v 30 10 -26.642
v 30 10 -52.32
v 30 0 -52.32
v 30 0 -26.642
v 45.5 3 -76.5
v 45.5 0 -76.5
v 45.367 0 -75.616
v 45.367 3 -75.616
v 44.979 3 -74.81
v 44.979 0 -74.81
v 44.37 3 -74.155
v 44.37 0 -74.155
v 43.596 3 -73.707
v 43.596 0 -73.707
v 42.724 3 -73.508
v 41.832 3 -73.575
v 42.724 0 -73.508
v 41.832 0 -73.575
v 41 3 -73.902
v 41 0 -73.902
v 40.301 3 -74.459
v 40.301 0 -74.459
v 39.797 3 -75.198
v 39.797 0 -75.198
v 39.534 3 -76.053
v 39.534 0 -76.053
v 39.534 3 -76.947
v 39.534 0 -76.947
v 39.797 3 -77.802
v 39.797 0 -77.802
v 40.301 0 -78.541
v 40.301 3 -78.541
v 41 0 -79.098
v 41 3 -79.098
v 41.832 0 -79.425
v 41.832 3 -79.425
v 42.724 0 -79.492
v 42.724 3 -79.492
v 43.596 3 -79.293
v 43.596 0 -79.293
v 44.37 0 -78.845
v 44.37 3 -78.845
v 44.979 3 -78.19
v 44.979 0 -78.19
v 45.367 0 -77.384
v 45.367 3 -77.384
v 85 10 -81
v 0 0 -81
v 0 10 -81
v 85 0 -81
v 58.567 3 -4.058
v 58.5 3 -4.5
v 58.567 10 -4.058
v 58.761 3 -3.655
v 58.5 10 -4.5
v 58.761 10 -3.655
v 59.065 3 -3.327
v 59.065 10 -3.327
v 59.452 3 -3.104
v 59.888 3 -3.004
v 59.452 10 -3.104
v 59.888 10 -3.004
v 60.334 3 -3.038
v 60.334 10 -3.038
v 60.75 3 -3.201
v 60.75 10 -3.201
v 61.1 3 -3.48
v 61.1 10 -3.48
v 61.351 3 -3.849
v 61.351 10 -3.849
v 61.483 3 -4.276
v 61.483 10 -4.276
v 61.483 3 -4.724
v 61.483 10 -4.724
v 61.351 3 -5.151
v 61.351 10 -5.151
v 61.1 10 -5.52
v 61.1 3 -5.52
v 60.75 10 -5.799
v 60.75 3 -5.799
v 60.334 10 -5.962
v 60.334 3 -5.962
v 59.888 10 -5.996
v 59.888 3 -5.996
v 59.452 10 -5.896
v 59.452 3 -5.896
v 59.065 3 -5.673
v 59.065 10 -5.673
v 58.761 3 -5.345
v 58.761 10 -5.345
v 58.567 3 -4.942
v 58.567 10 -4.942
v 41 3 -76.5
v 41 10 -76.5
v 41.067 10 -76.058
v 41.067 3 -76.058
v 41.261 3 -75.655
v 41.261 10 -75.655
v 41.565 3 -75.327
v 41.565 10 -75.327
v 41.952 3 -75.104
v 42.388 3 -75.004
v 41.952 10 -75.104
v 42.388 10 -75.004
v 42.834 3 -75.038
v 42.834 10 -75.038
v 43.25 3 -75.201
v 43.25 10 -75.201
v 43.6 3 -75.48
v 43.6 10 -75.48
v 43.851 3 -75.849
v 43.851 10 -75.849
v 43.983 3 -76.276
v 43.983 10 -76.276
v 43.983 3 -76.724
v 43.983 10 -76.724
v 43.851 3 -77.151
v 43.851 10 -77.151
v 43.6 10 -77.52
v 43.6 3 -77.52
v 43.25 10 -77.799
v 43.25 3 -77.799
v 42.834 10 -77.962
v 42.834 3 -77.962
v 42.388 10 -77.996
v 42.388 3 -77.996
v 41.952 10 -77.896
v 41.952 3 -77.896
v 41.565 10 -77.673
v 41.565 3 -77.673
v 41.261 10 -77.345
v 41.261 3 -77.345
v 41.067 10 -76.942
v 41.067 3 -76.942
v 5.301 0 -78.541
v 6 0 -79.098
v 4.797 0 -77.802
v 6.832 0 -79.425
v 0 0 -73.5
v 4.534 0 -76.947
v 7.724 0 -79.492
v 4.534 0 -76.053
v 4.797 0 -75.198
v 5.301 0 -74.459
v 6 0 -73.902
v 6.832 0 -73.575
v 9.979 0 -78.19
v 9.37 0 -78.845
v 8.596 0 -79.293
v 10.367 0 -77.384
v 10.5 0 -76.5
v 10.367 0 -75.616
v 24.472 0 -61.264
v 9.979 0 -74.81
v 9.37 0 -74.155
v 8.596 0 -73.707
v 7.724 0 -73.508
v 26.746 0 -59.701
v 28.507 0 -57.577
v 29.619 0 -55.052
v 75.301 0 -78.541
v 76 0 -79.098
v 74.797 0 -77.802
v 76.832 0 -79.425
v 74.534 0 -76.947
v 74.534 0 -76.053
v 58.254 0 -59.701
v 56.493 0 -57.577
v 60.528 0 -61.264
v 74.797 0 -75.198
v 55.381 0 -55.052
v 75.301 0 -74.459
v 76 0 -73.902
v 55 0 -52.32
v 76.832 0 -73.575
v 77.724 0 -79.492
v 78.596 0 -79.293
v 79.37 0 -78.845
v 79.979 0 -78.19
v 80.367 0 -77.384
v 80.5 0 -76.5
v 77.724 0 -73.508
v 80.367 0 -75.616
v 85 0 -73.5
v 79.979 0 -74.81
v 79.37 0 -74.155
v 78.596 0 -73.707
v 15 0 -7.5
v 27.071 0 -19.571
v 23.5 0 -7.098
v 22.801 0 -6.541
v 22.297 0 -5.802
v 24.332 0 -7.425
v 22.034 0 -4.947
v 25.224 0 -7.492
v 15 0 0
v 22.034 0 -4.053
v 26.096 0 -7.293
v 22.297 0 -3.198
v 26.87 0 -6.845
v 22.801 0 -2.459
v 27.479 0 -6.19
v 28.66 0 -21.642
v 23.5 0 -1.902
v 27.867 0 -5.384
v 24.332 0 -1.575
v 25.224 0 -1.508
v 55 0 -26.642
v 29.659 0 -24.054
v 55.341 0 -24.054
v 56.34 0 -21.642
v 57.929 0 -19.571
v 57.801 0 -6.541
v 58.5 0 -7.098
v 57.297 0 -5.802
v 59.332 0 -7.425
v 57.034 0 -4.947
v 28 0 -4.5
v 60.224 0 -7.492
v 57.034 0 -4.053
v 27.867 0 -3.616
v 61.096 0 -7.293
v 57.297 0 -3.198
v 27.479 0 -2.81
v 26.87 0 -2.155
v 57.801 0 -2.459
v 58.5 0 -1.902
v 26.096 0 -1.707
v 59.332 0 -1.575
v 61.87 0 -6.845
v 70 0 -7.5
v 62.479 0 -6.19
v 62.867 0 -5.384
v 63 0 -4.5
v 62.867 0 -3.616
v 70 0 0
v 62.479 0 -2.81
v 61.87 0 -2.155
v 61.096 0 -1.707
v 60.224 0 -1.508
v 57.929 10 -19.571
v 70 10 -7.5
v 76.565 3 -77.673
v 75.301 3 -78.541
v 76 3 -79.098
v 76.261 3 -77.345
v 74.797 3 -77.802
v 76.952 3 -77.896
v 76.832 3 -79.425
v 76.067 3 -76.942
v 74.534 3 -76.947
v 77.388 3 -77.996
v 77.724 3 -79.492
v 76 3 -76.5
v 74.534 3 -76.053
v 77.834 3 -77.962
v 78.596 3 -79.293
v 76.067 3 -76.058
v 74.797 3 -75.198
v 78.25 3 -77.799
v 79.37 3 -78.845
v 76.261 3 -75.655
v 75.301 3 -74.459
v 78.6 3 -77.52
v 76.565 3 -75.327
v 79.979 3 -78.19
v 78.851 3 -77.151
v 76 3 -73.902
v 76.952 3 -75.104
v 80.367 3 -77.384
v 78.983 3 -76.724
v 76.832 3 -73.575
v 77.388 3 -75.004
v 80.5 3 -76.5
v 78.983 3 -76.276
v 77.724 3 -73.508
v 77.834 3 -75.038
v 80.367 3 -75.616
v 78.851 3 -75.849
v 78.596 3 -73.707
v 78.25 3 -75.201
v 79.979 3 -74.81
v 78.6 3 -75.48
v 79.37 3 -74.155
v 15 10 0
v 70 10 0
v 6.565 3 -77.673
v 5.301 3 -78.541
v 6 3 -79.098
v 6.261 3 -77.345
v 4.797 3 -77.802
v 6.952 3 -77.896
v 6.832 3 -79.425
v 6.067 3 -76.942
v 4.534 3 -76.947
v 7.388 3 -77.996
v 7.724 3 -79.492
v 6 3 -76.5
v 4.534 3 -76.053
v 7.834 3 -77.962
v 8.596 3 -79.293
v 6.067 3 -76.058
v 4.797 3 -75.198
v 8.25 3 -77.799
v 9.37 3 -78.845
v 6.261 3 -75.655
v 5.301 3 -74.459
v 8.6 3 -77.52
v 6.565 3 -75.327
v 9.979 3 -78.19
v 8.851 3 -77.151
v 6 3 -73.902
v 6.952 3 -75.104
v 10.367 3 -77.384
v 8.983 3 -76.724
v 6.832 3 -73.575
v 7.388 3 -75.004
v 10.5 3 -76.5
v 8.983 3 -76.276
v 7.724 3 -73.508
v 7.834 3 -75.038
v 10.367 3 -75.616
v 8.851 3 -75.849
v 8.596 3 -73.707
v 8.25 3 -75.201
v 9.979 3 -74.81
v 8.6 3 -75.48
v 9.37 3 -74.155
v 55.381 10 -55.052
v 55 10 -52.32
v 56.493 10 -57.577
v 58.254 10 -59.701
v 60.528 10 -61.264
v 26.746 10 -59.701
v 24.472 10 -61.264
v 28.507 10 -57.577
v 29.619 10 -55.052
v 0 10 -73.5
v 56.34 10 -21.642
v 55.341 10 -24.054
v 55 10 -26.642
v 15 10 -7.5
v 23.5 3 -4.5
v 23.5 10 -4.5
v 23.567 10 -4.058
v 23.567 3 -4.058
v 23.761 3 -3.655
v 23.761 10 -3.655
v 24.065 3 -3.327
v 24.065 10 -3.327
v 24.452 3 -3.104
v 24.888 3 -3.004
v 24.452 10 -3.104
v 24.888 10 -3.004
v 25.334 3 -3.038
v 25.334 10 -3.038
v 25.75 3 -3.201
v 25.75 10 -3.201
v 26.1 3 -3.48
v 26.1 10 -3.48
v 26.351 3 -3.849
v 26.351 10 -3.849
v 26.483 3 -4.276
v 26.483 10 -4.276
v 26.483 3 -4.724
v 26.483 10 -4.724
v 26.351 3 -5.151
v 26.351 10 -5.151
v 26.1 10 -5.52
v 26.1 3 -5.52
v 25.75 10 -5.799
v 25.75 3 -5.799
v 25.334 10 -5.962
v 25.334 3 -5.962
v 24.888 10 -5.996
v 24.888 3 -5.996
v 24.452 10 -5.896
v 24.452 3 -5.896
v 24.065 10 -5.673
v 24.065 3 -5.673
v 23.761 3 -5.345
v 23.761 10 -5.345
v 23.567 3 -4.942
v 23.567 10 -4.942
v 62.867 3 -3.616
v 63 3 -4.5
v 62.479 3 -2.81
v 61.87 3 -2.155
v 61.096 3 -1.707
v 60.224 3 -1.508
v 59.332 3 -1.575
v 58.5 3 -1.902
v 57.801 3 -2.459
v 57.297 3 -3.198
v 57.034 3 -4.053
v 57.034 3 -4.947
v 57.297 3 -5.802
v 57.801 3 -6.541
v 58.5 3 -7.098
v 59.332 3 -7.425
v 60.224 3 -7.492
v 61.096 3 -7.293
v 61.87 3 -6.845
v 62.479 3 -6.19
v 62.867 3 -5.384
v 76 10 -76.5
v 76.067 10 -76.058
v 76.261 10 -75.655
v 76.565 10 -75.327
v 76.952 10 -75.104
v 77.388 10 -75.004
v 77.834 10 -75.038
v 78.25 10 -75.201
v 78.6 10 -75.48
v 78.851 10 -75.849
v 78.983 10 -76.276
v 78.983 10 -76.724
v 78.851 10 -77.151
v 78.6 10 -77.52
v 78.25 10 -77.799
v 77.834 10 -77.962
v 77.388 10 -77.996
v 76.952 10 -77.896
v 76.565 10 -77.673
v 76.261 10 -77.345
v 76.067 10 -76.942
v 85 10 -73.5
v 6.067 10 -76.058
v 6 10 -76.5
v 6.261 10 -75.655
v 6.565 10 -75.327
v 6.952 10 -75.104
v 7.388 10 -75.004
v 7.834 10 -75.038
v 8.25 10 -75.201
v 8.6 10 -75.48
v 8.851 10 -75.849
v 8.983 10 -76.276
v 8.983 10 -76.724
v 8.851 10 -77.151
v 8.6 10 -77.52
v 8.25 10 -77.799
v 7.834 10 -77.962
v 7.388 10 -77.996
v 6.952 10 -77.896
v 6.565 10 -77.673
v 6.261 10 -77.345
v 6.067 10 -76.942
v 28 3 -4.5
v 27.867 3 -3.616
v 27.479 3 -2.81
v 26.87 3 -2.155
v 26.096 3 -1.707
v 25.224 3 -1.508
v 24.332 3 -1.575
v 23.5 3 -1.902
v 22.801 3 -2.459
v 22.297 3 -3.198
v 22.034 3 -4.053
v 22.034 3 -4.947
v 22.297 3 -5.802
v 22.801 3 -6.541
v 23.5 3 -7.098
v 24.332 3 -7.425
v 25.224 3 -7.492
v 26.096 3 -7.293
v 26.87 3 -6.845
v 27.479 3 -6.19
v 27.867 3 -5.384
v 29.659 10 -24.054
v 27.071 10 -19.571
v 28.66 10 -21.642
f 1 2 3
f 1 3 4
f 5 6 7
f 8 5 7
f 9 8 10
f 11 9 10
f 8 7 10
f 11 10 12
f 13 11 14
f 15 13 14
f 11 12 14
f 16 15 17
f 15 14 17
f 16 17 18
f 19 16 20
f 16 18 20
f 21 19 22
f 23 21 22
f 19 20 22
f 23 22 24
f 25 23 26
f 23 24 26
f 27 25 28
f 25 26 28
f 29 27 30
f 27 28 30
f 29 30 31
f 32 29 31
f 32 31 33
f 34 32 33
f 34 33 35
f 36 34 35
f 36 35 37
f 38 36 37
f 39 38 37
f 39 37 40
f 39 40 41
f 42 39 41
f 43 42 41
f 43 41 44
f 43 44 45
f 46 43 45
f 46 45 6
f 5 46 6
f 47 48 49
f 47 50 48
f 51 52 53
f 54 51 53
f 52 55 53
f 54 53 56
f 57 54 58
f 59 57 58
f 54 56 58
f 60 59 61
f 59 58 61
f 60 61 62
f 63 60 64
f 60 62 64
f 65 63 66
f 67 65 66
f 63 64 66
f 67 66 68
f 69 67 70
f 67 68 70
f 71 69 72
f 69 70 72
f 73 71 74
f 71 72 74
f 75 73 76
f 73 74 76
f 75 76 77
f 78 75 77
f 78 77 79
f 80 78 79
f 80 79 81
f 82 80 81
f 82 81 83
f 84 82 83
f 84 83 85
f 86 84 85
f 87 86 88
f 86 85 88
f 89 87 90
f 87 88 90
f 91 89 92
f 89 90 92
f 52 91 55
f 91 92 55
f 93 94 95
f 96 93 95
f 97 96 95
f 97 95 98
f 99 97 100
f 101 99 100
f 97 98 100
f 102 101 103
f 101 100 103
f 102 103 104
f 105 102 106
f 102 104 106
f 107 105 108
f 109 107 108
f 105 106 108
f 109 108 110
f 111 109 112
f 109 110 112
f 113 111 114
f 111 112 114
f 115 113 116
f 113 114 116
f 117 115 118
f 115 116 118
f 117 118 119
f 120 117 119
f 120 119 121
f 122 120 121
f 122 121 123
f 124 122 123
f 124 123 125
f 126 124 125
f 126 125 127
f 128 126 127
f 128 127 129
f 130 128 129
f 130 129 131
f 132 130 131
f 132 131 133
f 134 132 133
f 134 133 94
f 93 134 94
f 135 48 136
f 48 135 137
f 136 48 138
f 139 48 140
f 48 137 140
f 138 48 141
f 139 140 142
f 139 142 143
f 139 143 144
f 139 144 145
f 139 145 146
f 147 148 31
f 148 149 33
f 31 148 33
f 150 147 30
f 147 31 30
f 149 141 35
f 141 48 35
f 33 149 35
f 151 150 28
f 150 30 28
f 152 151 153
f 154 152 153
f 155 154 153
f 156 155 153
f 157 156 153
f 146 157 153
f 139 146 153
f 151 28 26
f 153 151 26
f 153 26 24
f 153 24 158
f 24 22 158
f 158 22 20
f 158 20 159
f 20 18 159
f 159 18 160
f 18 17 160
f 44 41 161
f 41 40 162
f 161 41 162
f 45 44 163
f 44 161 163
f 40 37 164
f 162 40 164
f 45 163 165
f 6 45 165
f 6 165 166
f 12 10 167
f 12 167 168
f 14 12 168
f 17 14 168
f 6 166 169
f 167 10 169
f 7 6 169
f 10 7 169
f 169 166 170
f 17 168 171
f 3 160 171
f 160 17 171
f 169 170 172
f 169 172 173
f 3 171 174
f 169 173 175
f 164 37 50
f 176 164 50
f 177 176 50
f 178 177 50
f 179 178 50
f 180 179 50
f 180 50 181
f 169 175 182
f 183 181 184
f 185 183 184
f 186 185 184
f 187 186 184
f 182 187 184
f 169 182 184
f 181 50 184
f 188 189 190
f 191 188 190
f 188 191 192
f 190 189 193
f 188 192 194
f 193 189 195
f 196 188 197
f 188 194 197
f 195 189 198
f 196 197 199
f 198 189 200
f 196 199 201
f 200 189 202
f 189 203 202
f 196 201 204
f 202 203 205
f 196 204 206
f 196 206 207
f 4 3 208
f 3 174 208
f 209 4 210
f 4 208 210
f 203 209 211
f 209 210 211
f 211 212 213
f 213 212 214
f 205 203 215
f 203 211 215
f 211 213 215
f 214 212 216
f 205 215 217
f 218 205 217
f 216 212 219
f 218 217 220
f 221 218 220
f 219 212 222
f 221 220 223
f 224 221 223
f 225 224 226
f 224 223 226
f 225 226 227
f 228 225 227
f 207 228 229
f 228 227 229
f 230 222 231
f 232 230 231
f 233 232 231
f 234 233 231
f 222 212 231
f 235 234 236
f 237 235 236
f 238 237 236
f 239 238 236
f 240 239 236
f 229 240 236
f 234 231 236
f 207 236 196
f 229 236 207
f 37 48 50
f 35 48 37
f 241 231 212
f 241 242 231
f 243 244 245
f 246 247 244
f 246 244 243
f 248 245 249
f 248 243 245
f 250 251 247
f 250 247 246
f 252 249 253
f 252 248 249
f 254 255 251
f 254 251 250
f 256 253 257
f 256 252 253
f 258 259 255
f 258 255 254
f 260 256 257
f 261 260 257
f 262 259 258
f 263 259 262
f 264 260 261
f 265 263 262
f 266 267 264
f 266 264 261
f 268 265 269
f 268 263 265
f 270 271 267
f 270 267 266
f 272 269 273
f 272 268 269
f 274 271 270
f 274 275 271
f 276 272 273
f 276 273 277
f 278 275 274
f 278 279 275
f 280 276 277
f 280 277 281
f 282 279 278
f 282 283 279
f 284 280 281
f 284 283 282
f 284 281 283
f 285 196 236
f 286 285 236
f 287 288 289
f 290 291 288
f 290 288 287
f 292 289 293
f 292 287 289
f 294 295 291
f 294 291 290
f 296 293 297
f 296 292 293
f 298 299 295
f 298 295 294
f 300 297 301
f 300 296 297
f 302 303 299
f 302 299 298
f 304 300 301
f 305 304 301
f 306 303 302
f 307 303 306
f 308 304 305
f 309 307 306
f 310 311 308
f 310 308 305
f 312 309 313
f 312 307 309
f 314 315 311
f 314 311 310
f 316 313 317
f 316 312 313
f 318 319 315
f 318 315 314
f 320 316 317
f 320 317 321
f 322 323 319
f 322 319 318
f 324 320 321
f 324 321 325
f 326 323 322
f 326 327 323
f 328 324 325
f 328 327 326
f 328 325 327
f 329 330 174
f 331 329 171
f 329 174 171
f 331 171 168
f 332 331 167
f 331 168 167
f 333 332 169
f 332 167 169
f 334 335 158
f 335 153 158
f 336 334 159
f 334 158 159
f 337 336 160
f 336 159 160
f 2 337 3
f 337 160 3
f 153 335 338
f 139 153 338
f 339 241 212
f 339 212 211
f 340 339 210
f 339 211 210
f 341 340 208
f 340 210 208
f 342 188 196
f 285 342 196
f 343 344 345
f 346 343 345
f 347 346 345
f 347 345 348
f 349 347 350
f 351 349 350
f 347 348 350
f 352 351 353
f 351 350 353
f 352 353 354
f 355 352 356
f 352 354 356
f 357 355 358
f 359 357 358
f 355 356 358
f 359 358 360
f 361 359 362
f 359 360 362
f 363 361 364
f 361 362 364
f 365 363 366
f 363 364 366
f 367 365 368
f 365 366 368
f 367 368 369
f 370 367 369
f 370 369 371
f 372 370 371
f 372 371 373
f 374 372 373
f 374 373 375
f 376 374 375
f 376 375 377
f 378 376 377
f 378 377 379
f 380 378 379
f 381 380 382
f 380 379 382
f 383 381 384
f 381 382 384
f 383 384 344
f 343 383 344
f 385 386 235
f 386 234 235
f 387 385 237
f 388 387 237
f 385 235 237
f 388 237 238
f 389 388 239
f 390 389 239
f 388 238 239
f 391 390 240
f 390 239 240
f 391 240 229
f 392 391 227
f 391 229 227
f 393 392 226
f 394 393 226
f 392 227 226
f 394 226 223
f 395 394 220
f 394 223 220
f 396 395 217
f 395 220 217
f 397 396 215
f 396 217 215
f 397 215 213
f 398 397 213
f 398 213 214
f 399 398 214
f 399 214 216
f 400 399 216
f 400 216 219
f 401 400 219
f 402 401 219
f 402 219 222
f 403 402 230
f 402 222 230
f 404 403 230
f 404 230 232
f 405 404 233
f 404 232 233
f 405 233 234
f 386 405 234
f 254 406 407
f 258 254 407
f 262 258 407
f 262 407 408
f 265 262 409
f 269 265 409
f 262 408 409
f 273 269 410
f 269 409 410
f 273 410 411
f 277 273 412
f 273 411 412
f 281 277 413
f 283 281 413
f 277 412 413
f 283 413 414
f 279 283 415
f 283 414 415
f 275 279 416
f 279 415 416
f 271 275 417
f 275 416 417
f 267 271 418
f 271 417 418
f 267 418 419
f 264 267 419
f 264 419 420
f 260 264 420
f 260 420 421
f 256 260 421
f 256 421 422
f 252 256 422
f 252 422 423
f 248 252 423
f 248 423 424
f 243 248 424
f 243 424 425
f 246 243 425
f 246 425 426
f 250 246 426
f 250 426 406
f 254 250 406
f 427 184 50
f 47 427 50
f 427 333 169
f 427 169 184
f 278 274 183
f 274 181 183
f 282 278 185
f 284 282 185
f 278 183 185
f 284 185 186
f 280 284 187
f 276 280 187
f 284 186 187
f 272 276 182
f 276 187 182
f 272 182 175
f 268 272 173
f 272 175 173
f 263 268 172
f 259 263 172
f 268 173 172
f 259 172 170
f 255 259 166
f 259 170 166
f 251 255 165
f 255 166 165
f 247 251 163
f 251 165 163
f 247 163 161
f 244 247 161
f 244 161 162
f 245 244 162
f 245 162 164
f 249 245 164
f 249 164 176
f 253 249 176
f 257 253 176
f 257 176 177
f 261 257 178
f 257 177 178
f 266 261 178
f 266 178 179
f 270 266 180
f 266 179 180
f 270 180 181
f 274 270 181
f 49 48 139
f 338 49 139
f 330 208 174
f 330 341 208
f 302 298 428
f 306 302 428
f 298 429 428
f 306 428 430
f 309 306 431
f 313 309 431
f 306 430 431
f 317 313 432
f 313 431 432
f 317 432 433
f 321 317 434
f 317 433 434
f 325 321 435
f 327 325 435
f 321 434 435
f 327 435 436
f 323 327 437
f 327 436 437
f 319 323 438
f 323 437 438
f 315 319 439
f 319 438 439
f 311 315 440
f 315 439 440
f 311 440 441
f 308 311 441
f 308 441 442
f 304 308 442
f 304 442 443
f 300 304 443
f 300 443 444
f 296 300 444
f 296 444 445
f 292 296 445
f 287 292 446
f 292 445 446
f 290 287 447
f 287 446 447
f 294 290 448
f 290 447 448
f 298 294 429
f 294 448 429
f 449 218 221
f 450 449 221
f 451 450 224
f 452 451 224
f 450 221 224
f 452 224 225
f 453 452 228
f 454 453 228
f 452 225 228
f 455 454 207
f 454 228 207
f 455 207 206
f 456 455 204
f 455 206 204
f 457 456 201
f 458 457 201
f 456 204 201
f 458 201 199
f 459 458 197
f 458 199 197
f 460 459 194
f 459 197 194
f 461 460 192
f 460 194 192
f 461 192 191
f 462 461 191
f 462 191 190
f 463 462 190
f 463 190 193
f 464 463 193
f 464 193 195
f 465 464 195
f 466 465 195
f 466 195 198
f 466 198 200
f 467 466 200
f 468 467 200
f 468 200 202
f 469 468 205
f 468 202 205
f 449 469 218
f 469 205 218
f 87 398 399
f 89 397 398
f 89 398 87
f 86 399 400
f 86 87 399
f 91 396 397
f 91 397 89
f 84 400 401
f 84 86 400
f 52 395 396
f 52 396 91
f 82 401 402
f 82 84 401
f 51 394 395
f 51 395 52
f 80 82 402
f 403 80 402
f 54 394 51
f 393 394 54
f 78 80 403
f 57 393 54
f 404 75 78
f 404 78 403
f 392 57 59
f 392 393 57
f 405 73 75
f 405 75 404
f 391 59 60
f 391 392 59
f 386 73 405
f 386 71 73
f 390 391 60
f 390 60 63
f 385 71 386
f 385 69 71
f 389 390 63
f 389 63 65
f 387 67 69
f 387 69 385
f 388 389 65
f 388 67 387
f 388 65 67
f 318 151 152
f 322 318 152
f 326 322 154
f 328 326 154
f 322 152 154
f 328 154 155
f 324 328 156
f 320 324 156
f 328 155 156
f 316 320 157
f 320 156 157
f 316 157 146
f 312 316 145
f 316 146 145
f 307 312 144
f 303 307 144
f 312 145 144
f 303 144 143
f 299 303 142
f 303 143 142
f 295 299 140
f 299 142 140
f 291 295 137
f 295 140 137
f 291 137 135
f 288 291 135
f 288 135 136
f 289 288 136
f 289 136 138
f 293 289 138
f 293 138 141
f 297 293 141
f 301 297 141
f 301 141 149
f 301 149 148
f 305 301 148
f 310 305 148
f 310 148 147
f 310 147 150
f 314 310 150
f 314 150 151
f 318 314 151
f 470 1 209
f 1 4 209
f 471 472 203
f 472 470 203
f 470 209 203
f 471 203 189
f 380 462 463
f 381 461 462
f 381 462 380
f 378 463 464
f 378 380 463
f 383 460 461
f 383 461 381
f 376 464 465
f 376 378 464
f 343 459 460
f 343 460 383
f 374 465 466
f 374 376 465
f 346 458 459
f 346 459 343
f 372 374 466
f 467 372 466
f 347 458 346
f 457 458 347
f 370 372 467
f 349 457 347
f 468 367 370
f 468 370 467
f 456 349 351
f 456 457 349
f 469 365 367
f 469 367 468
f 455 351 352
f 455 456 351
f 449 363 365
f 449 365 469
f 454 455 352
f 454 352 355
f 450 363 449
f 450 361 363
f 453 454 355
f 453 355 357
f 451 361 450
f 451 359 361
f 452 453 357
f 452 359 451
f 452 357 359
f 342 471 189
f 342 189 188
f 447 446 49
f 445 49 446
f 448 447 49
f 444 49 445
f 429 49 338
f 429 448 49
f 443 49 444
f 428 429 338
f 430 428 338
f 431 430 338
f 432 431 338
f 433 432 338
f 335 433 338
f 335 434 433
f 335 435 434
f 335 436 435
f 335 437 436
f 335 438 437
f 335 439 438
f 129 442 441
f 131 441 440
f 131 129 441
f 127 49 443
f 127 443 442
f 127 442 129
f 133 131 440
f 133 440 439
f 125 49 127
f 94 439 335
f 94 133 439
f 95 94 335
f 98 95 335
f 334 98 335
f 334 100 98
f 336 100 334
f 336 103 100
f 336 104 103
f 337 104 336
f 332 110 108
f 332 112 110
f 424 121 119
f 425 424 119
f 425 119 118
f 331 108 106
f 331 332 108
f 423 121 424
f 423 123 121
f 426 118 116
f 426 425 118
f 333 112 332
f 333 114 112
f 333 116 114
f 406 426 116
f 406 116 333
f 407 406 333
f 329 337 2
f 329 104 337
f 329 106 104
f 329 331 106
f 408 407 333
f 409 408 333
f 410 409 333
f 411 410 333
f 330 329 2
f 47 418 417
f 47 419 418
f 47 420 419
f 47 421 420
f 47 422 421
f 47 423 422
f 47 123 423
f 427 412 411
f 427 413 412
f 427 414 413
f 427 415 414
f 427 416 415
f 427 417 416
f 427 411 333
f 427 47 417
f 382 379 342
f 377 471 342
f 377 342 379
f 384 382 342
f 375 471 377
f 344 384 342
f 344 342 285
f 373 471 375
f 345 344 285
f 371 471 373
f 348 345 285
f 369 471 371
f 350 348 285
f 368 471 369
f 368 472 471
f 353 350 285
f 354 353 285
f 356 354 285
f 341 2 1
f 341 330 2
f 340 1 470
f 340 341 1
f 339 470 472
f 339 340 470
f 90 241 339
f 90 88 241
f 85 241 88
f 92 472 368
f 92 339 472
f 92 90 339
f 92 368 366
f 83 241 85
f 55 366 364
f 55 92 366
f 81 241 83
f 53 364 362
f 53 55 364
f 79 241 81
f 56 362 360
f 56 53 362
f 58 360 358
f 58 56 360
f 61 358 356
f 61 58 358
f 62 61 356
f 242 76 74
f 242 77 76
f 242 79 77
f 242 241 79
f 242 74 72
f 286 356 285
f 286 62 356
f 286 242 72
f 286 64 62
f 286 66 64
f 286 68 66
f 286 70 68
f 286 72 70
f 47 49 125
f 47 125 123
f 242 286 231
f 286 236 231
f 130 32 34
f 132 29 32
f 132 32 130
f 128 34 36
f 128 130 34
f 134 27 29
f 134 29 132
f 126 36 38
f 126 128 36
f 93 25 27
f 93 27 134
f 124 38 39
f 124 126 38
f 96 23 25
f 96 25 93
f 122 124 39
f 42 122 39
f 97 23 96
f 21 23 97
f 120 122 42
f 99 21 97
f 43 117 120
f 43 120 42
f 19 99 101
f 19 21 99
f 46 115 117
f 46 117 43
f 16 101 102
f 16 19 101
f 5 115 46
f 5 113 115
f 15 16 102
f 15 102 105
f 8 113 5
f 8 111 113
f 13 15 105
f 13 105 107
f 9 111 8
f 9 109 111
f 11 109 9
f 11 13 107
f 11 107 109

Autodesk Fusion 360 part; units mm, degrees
sketch "Sketch13" plane through (0, 0, 0) normal (0, 1, 0) x (1, 0, 0)
  line L0 (70, 0) -> (70, 81)
  line L1 (70, 81) -> (15, 81)
  line L2 (15, 81) -> (15, 0)
  line L3 (15, 0) -> (70, 0)
  line L4 (0, 0) -> (121.9113, 0) construction
  dimension "d66" = 55
  dimension "d130" = 81
  dimension "d131" = 15
extrude "Extrude10" add sketch "Sketch13" along normal blind 10
sketch "Sketch14" plane through (0, 10, 0) normal (0, 1, 0) x (-1, 0, 0)
  line L0 (-15, -81) -> (-15, 0)
  line L1 (-70, 0) -> (-70, -81)
  line L2 (-70, -81) -> (-15, -81)
  line L3 (-15, -73.5) -> (-30, -58.5)
  line L4 (-30, -58.5) -> (-30, -22.5)
  line L5 (-30, -22.5) -> (-15, -7.5)
  line L6 (-15, -40.5) -> (-70, -40.5) construction
  line L7 (-42.5, -81) -> (-42.5, 0) construction
  line L8 (-30, -40.5) -> (-87.9308, -40.5) construction
  line L9 (-70, -7.5) -> (-55, -22.5)
  line L10 (-55, -22.5) -> (-55, -58.5)
  line L11 (-55, -58.5) -> (-70, -73.5)
  circle A0 centre (-42.5, -76.5) radius 1.5
  circle A1 centre (-60, -76.5) radius 1.5
  circle A2 centre (-77.5, -76.5) radius 1.5
  circle A3 centre (-25, -76.5) radius 1.5
  circle A4 centre (-7.5, -76.5) radius 1.5
  line L12 (-7.5, -76.5) -> (-77.5, -76.5) construction
  circle A5 centre (-7.5, -4.5) radius 1.5
  circle A6 centre (-25, -4.5) radius 1.5
  circle A7 centre (-42.5, -4.5) radius 1.5
  circle A8 centre (-60, -4.5) radius 1.5
  circle A9 centre (-77.5, -4.5) radius 1.5
  line L13 (-7.5, -4.5) -> (-77.5, -4.5) construction
  line L14 (-15, 0) -> (-70, 0)
  line L15 (-30, -22.5) -> (-15, -22.5)
  line L16 (-55, -22.5) -> (-70, -22.5)
  line L17 (-30, -58.5) -> (-15, -58.5)
  line L18 (-55, -58.5) -> (-70, -58.5)
  line L19 (-70, -58.5) -> (-70, -73.5)
  line L20 (-15, -58.5) -> (-15, -73.5)
  line L21 (-15, -22.5) -> (-15, -7.5)
  line L22 (-70, -22.5) -> (-70, -7.5)
  line L23 (-70, -22.5) -> (-70, -58.5)
  line L24 (-15, -22.5) -> (-15, -58.5)
  dimension "d70" = 15
  dimension "d71" = 15
  dimension "d72" = 15
  dimension "d73" = 7.5
  dimension "d76" = 15
  dimension "d77" = 15
  dimension "d78" = 7.5
  dimension "d79" = 7.5
  dimension "d80" = 15
  dimension "d81" = 15
  dimension "d85" = 17.5
  dimension "d86" = 17.5
  dimension "d87" = 17.5
  dimension "d88" = 17.5
  dimension "d89" = 3
  dimension "d90" = 3
  dimension "d91" = 3
  dimension "d92" = 3
  dimension "d93" = 3
  dimension "d94" = 4.5
  dimension "d95" = 17.5
  dimension "d96" = 17.5
  dimension "d97" = 17.5
  dimension "d98" = 17.5
  dimension "d99" = 3
  dimension "d100" = 3
  dimension "d101" = 3
  dimension "d102" = 3
  dimension "d103" = 3
  dimension "d132" = 7.5
  dimension "d139" = 4.5
  dimension "d140" = 72
  dimension "d141" = 40.5
extrude "Extrude11" cut sketch "Sketch14" against normal blind 10 contours L0 L4 L15 L17 L24 | L0 L5 L15 L21 | L1 L10 L16 L18 L23 | L1 L9 L16 L22
sketch "Sketch16" plane through (0, 10, 0) normal (0, 1, 0) x (-1, 0, 0)
  line L0 (-70, -58.5) -> (-70, -81)
  line L1 (-70, -81) -> (-15, -81)
  line L2 (-15, -81) -> (-15, -58.5)
  line L3 (-30, -58.5) -> (-30, -22.5)
  circle A0 centre (-42.5, -40.5) radius 4
  line L4 (-15, 0) -> (-70, 0)
  line L5 (-70, 0) -> (-70, -7.5)
  line L6 (-55, -22.5) -> (-55, -58.5)
  line L7 (-15, -58.5) -> (-30, -58.5)
  line L8 (-30, -22.5) -> (-15, -7.5)
  line L9 (-15, -7.5) -> (-15, 0)
  line L10 (-70, -7.5) -> (-55, -22.5)
  line L11 (-55, -58.5) -> (-70, -58.5)
  dimension "d83" = 8
extrude "Extrude14" cut sketch "Sketch14" against normal blind 10 contours A6 | A8
sketch "Sketch17" plane through (30, 0, 0) normal (-1, 0, 0) x (0, 0, 1)
  line L0 (-58.5, 0) -> (-22.5, 0)
  line L1 (-22.5, 10) -> (-58.5, 10)
  circle A0 centre (-52.5, 6.35) radius 2
  circle A1 centre (-28.5, 6.35) radius 2
  line L2 (-52.5, 6.35) -> (-28.5, 6.35) construction
  line L3 (-58.5, 10) -> (-58.5, 0)
  line L4 (-22.5, 0) -> (-22.5, 10)
  dimension "d105" = 6.35
  dimension "d106" = 4
  dimension "d107" = 4
  dimension "d108" = 40.5
  dimension "d113" = 24
sketch "Sketch22" plane through (0, 10, 0) normal (0, 1, 0) x (-1, 0, 0)
  circle A0 centre (-60, -4.5) radius 1.5
  circle A1 centre (-25, -4.5) radius 1.5
  line L0 (-70, -58.5) -> (-70, -81)
  line L1 (-70, -81) -> (-15, -81)
  line L2 (-15, -81) -> (-15, -58.5)
  line L3 (-30, -58.5) -> (-30, -22.5)
  spline S0 degree 5 poles (-30, -22.5) (-30.6751, -22.9508) (-31.8982, -23.9212) (-33.3513, -25.5829) (-34.5873, -28.1895) (-35.2819, -31.9804) (-35.49, -36.1444) (-35.514, -40.4999) (-35.4911, -44.8557) (-35.2837, -49.0204) (-34.5894, -52.8118) (-33.353, -55.4184) (-31.8992, -57.0796) (-30.6755, -58.0495) (-30, -58.5) knots 0 0 0 0 0 0 0.1 0.2 0.3 0.4 0.5 0.6 0.7 0.8 0.9 1 1 1 1 1 1
  line L4 (-26.6736, -20.2785) -> (-33.3264, -24.7215)
  line L5 (-33.3277, -56.2805) -> (-26.6723, -60.7195)
  spline S1 degree 5 poles (-55, -22.5) (-54.3243, -22.9503) (-53.092, -23.9257) (-51.6007, -25.6127) (-50.2803, -28.2784) (-49.4997, -32.1312) (-49.3061, -36.2868) (-49.4506, -40.5251) (-49.7869, -44.6606) (-50.3396, -48.5814) (-51.2418, -52.2256) (-52.3883, -54.8952) (-53.5623, -56.7538) (-54.4956, -57.9286) (-55, -58.5) knots 0 0 0 0 0 0 0.1 0.2 0.3 0.4 0.5 0.6 0.7 0.8 0.9 1 1 1 1 1 1
  line L6 (-52.3529, -55.5012) -> (-57.6471, -61.4988)
  line L7 (-58.3285, -20.2817) -> (-51.6715, -24.7183)
  line L8 (-15, 0) -> (-70, 0)
  line L9 (-70, 0) -> (-70, -7.5)
  line L10 (-35.5, -40.5) -> (-49.5, -40.5) construction
  line L11 (-55, -22.5) -> (-55, -58.5)
  line L12 (-15, -58.5) -> (-30, -58.5)
  line L13 (-30, -22.5) -> (-15, -7.5)
  line L14 (-15, -7.5) -> (-15, 0)
  line L15 (-70, -7.5) -> (-55, -22.5)
  line L16 (-55, -58.5) -> (-70, -58.5)
  dimension "d135" = 4
  dimension "d136" = 4
  dimension "d137" = 4
  dimension "d138" = 4
  dimension "d161" = 40.5
  dimension "d162" = 14
  dimension "d163" = 35.5
extrude "Extrude22" add 1 faces at (70, 3.3333, -66) along direction (1, 0, 0) blind 15
extrude "Extrude23" add 1 faces at (15, 3.3333, -73.5) along direction (-1, 0, 0) blind 15
extrude "Extrude24" cut sketch "Sketch14" against normal through all contours A0 | A2 | A4
sketch "Sketch24" plane through (0, 0, 0) normal (0, -1, 0) x (1, 0, 0)
  circle A0 centre (7.5, -76.5) radius 1.5
  circle A1 centre (77.5, -76.5) radius 1.5
  circle A2 centre (42.5, -76.5) radius 1.5
  circle A3 centre (60, -4.5) radius 1.5
  circle A4 centre (25, -4.5) radius 1.5
  line L0 (0, -58.5) -> (0, -81)
  line L1 (0, -81) -> (85, -81)
  line L2 (85, -81) -> (85, -58.5)
  line L3 (70, -7.5) -> (70, 0)
  line L4 (70, 0) -> (15, 0)
  line L5 (15, 0) -> (15, -7.5)
  circle A5 centre (25, -4.5) radius 1.5
  circle A6 centre (60, -4.5) radius 1.5
  circle A7 centre (7.5, -76.5) radius 1.5
  circle A8 centre (42.5, -76.5) radius 1.5
  circle A9 centre (77.5, -76.5) radius 1.5
  circle A10 centre (25, -4.5) radius 3
  circle A11 centre (60, -4.5) radius 3
  circle A12 centre (7.5, -76.5) radius 3
  circle A13 centre (42.5, -76.5) radius 3
  circle A14 centre (77.5, -76.5) radius 3
  line L6 (30, -22.5) -> (30, -58.5)
  line L7 (55, -58.5) -> (55, -22.5)
  line L8 (30, -58.5) -> (0, -58.5)
  line L9 (55, -22.5) -> (70, -7.5)
  line L10 (15, -7.5) -> (30, -22.5)
  line L11 (85, -58.5) -> (55, -58.5)
  dimension "d154" = 6
  dimension "d155" = 6
  dimension "d156" = 6
  dimension "d157" = 6
  dimension "d158" = 6
extrude "Extrude25" cut sketch "Sketch24" against normal blind 3 contours A10 | A11 | A12 | A13 | A14
sketch "Sketch25" plane through (0, 10, 0) normal (0, 1, 0) x (-1, 0, 0)
  circle A0 centre (-7.5, -76.5) radius 1.5
  circle A1 centre (-77.5, -76.5) radius 1.5
  circle A2 centre (-42.5, -76.5) radius 1.5
  circle A3 centre (-25, -4.5) radius 1.5
  circle A4 centre (-60, -4.5) radius 1.5
  line L0 (-30, -22.5) -> (-15, -7.5)
  line L1 (-15, -7.5) -> (-15, 0)
  line L2 (-15, 0) -> (-70, 0)
  line L3 (-70, 0) -> (-70, -7.5)
  line L4 (-70, -7.5) -> (-55, -22.5)
  line L5 (-55, -22.5) -> (-55, -58.5)
  line L6 (-55, -58.5) -> (-85, -58.5)
  line L7 (-85, -58.5) -> (-85, -81)
  line L8 (-85, -81) -> (0, -81)
  line L9 (0, -81) -> (0, -58.5)
  line L10 (0, -58.5) -> (-30, -58.5)
  line L11 (-30, -58.5) -> (-30, -22.5)
  line L12 (-30, -58.5) -> (0, -73.5)
  line L13 (-55, -58.5) -> (-85, -73.5)
  line L14 (0, -73.5) -> (0, -58.5)
  line L15 (-30, -58.5) -> (0, -58.5)
  line L16 (-85, -58.5) -> (-85, -73.5)
  line L17 (-55, -58.5) -> (-85, -58.5)
  dimension "d165" = 7.5
  dimension "d166" = 7.5
extrude "Extrude26" cut sketch "Sketch25" against normal blind 10 contours L9 L10 L12 L14 L15 | L6 L7 L13 L16 L17
fillet "Fillet1" radius 10 4 edges at (30, 5, -58.5) (30, 5, -22.5) (55, 5, -58.5) (55, 5, -22.5)
equation "d105 = ( 12.7 / 2 ) * 1 mm"
equation "d108 = ( 81 / 2 ) * 1 mm"
